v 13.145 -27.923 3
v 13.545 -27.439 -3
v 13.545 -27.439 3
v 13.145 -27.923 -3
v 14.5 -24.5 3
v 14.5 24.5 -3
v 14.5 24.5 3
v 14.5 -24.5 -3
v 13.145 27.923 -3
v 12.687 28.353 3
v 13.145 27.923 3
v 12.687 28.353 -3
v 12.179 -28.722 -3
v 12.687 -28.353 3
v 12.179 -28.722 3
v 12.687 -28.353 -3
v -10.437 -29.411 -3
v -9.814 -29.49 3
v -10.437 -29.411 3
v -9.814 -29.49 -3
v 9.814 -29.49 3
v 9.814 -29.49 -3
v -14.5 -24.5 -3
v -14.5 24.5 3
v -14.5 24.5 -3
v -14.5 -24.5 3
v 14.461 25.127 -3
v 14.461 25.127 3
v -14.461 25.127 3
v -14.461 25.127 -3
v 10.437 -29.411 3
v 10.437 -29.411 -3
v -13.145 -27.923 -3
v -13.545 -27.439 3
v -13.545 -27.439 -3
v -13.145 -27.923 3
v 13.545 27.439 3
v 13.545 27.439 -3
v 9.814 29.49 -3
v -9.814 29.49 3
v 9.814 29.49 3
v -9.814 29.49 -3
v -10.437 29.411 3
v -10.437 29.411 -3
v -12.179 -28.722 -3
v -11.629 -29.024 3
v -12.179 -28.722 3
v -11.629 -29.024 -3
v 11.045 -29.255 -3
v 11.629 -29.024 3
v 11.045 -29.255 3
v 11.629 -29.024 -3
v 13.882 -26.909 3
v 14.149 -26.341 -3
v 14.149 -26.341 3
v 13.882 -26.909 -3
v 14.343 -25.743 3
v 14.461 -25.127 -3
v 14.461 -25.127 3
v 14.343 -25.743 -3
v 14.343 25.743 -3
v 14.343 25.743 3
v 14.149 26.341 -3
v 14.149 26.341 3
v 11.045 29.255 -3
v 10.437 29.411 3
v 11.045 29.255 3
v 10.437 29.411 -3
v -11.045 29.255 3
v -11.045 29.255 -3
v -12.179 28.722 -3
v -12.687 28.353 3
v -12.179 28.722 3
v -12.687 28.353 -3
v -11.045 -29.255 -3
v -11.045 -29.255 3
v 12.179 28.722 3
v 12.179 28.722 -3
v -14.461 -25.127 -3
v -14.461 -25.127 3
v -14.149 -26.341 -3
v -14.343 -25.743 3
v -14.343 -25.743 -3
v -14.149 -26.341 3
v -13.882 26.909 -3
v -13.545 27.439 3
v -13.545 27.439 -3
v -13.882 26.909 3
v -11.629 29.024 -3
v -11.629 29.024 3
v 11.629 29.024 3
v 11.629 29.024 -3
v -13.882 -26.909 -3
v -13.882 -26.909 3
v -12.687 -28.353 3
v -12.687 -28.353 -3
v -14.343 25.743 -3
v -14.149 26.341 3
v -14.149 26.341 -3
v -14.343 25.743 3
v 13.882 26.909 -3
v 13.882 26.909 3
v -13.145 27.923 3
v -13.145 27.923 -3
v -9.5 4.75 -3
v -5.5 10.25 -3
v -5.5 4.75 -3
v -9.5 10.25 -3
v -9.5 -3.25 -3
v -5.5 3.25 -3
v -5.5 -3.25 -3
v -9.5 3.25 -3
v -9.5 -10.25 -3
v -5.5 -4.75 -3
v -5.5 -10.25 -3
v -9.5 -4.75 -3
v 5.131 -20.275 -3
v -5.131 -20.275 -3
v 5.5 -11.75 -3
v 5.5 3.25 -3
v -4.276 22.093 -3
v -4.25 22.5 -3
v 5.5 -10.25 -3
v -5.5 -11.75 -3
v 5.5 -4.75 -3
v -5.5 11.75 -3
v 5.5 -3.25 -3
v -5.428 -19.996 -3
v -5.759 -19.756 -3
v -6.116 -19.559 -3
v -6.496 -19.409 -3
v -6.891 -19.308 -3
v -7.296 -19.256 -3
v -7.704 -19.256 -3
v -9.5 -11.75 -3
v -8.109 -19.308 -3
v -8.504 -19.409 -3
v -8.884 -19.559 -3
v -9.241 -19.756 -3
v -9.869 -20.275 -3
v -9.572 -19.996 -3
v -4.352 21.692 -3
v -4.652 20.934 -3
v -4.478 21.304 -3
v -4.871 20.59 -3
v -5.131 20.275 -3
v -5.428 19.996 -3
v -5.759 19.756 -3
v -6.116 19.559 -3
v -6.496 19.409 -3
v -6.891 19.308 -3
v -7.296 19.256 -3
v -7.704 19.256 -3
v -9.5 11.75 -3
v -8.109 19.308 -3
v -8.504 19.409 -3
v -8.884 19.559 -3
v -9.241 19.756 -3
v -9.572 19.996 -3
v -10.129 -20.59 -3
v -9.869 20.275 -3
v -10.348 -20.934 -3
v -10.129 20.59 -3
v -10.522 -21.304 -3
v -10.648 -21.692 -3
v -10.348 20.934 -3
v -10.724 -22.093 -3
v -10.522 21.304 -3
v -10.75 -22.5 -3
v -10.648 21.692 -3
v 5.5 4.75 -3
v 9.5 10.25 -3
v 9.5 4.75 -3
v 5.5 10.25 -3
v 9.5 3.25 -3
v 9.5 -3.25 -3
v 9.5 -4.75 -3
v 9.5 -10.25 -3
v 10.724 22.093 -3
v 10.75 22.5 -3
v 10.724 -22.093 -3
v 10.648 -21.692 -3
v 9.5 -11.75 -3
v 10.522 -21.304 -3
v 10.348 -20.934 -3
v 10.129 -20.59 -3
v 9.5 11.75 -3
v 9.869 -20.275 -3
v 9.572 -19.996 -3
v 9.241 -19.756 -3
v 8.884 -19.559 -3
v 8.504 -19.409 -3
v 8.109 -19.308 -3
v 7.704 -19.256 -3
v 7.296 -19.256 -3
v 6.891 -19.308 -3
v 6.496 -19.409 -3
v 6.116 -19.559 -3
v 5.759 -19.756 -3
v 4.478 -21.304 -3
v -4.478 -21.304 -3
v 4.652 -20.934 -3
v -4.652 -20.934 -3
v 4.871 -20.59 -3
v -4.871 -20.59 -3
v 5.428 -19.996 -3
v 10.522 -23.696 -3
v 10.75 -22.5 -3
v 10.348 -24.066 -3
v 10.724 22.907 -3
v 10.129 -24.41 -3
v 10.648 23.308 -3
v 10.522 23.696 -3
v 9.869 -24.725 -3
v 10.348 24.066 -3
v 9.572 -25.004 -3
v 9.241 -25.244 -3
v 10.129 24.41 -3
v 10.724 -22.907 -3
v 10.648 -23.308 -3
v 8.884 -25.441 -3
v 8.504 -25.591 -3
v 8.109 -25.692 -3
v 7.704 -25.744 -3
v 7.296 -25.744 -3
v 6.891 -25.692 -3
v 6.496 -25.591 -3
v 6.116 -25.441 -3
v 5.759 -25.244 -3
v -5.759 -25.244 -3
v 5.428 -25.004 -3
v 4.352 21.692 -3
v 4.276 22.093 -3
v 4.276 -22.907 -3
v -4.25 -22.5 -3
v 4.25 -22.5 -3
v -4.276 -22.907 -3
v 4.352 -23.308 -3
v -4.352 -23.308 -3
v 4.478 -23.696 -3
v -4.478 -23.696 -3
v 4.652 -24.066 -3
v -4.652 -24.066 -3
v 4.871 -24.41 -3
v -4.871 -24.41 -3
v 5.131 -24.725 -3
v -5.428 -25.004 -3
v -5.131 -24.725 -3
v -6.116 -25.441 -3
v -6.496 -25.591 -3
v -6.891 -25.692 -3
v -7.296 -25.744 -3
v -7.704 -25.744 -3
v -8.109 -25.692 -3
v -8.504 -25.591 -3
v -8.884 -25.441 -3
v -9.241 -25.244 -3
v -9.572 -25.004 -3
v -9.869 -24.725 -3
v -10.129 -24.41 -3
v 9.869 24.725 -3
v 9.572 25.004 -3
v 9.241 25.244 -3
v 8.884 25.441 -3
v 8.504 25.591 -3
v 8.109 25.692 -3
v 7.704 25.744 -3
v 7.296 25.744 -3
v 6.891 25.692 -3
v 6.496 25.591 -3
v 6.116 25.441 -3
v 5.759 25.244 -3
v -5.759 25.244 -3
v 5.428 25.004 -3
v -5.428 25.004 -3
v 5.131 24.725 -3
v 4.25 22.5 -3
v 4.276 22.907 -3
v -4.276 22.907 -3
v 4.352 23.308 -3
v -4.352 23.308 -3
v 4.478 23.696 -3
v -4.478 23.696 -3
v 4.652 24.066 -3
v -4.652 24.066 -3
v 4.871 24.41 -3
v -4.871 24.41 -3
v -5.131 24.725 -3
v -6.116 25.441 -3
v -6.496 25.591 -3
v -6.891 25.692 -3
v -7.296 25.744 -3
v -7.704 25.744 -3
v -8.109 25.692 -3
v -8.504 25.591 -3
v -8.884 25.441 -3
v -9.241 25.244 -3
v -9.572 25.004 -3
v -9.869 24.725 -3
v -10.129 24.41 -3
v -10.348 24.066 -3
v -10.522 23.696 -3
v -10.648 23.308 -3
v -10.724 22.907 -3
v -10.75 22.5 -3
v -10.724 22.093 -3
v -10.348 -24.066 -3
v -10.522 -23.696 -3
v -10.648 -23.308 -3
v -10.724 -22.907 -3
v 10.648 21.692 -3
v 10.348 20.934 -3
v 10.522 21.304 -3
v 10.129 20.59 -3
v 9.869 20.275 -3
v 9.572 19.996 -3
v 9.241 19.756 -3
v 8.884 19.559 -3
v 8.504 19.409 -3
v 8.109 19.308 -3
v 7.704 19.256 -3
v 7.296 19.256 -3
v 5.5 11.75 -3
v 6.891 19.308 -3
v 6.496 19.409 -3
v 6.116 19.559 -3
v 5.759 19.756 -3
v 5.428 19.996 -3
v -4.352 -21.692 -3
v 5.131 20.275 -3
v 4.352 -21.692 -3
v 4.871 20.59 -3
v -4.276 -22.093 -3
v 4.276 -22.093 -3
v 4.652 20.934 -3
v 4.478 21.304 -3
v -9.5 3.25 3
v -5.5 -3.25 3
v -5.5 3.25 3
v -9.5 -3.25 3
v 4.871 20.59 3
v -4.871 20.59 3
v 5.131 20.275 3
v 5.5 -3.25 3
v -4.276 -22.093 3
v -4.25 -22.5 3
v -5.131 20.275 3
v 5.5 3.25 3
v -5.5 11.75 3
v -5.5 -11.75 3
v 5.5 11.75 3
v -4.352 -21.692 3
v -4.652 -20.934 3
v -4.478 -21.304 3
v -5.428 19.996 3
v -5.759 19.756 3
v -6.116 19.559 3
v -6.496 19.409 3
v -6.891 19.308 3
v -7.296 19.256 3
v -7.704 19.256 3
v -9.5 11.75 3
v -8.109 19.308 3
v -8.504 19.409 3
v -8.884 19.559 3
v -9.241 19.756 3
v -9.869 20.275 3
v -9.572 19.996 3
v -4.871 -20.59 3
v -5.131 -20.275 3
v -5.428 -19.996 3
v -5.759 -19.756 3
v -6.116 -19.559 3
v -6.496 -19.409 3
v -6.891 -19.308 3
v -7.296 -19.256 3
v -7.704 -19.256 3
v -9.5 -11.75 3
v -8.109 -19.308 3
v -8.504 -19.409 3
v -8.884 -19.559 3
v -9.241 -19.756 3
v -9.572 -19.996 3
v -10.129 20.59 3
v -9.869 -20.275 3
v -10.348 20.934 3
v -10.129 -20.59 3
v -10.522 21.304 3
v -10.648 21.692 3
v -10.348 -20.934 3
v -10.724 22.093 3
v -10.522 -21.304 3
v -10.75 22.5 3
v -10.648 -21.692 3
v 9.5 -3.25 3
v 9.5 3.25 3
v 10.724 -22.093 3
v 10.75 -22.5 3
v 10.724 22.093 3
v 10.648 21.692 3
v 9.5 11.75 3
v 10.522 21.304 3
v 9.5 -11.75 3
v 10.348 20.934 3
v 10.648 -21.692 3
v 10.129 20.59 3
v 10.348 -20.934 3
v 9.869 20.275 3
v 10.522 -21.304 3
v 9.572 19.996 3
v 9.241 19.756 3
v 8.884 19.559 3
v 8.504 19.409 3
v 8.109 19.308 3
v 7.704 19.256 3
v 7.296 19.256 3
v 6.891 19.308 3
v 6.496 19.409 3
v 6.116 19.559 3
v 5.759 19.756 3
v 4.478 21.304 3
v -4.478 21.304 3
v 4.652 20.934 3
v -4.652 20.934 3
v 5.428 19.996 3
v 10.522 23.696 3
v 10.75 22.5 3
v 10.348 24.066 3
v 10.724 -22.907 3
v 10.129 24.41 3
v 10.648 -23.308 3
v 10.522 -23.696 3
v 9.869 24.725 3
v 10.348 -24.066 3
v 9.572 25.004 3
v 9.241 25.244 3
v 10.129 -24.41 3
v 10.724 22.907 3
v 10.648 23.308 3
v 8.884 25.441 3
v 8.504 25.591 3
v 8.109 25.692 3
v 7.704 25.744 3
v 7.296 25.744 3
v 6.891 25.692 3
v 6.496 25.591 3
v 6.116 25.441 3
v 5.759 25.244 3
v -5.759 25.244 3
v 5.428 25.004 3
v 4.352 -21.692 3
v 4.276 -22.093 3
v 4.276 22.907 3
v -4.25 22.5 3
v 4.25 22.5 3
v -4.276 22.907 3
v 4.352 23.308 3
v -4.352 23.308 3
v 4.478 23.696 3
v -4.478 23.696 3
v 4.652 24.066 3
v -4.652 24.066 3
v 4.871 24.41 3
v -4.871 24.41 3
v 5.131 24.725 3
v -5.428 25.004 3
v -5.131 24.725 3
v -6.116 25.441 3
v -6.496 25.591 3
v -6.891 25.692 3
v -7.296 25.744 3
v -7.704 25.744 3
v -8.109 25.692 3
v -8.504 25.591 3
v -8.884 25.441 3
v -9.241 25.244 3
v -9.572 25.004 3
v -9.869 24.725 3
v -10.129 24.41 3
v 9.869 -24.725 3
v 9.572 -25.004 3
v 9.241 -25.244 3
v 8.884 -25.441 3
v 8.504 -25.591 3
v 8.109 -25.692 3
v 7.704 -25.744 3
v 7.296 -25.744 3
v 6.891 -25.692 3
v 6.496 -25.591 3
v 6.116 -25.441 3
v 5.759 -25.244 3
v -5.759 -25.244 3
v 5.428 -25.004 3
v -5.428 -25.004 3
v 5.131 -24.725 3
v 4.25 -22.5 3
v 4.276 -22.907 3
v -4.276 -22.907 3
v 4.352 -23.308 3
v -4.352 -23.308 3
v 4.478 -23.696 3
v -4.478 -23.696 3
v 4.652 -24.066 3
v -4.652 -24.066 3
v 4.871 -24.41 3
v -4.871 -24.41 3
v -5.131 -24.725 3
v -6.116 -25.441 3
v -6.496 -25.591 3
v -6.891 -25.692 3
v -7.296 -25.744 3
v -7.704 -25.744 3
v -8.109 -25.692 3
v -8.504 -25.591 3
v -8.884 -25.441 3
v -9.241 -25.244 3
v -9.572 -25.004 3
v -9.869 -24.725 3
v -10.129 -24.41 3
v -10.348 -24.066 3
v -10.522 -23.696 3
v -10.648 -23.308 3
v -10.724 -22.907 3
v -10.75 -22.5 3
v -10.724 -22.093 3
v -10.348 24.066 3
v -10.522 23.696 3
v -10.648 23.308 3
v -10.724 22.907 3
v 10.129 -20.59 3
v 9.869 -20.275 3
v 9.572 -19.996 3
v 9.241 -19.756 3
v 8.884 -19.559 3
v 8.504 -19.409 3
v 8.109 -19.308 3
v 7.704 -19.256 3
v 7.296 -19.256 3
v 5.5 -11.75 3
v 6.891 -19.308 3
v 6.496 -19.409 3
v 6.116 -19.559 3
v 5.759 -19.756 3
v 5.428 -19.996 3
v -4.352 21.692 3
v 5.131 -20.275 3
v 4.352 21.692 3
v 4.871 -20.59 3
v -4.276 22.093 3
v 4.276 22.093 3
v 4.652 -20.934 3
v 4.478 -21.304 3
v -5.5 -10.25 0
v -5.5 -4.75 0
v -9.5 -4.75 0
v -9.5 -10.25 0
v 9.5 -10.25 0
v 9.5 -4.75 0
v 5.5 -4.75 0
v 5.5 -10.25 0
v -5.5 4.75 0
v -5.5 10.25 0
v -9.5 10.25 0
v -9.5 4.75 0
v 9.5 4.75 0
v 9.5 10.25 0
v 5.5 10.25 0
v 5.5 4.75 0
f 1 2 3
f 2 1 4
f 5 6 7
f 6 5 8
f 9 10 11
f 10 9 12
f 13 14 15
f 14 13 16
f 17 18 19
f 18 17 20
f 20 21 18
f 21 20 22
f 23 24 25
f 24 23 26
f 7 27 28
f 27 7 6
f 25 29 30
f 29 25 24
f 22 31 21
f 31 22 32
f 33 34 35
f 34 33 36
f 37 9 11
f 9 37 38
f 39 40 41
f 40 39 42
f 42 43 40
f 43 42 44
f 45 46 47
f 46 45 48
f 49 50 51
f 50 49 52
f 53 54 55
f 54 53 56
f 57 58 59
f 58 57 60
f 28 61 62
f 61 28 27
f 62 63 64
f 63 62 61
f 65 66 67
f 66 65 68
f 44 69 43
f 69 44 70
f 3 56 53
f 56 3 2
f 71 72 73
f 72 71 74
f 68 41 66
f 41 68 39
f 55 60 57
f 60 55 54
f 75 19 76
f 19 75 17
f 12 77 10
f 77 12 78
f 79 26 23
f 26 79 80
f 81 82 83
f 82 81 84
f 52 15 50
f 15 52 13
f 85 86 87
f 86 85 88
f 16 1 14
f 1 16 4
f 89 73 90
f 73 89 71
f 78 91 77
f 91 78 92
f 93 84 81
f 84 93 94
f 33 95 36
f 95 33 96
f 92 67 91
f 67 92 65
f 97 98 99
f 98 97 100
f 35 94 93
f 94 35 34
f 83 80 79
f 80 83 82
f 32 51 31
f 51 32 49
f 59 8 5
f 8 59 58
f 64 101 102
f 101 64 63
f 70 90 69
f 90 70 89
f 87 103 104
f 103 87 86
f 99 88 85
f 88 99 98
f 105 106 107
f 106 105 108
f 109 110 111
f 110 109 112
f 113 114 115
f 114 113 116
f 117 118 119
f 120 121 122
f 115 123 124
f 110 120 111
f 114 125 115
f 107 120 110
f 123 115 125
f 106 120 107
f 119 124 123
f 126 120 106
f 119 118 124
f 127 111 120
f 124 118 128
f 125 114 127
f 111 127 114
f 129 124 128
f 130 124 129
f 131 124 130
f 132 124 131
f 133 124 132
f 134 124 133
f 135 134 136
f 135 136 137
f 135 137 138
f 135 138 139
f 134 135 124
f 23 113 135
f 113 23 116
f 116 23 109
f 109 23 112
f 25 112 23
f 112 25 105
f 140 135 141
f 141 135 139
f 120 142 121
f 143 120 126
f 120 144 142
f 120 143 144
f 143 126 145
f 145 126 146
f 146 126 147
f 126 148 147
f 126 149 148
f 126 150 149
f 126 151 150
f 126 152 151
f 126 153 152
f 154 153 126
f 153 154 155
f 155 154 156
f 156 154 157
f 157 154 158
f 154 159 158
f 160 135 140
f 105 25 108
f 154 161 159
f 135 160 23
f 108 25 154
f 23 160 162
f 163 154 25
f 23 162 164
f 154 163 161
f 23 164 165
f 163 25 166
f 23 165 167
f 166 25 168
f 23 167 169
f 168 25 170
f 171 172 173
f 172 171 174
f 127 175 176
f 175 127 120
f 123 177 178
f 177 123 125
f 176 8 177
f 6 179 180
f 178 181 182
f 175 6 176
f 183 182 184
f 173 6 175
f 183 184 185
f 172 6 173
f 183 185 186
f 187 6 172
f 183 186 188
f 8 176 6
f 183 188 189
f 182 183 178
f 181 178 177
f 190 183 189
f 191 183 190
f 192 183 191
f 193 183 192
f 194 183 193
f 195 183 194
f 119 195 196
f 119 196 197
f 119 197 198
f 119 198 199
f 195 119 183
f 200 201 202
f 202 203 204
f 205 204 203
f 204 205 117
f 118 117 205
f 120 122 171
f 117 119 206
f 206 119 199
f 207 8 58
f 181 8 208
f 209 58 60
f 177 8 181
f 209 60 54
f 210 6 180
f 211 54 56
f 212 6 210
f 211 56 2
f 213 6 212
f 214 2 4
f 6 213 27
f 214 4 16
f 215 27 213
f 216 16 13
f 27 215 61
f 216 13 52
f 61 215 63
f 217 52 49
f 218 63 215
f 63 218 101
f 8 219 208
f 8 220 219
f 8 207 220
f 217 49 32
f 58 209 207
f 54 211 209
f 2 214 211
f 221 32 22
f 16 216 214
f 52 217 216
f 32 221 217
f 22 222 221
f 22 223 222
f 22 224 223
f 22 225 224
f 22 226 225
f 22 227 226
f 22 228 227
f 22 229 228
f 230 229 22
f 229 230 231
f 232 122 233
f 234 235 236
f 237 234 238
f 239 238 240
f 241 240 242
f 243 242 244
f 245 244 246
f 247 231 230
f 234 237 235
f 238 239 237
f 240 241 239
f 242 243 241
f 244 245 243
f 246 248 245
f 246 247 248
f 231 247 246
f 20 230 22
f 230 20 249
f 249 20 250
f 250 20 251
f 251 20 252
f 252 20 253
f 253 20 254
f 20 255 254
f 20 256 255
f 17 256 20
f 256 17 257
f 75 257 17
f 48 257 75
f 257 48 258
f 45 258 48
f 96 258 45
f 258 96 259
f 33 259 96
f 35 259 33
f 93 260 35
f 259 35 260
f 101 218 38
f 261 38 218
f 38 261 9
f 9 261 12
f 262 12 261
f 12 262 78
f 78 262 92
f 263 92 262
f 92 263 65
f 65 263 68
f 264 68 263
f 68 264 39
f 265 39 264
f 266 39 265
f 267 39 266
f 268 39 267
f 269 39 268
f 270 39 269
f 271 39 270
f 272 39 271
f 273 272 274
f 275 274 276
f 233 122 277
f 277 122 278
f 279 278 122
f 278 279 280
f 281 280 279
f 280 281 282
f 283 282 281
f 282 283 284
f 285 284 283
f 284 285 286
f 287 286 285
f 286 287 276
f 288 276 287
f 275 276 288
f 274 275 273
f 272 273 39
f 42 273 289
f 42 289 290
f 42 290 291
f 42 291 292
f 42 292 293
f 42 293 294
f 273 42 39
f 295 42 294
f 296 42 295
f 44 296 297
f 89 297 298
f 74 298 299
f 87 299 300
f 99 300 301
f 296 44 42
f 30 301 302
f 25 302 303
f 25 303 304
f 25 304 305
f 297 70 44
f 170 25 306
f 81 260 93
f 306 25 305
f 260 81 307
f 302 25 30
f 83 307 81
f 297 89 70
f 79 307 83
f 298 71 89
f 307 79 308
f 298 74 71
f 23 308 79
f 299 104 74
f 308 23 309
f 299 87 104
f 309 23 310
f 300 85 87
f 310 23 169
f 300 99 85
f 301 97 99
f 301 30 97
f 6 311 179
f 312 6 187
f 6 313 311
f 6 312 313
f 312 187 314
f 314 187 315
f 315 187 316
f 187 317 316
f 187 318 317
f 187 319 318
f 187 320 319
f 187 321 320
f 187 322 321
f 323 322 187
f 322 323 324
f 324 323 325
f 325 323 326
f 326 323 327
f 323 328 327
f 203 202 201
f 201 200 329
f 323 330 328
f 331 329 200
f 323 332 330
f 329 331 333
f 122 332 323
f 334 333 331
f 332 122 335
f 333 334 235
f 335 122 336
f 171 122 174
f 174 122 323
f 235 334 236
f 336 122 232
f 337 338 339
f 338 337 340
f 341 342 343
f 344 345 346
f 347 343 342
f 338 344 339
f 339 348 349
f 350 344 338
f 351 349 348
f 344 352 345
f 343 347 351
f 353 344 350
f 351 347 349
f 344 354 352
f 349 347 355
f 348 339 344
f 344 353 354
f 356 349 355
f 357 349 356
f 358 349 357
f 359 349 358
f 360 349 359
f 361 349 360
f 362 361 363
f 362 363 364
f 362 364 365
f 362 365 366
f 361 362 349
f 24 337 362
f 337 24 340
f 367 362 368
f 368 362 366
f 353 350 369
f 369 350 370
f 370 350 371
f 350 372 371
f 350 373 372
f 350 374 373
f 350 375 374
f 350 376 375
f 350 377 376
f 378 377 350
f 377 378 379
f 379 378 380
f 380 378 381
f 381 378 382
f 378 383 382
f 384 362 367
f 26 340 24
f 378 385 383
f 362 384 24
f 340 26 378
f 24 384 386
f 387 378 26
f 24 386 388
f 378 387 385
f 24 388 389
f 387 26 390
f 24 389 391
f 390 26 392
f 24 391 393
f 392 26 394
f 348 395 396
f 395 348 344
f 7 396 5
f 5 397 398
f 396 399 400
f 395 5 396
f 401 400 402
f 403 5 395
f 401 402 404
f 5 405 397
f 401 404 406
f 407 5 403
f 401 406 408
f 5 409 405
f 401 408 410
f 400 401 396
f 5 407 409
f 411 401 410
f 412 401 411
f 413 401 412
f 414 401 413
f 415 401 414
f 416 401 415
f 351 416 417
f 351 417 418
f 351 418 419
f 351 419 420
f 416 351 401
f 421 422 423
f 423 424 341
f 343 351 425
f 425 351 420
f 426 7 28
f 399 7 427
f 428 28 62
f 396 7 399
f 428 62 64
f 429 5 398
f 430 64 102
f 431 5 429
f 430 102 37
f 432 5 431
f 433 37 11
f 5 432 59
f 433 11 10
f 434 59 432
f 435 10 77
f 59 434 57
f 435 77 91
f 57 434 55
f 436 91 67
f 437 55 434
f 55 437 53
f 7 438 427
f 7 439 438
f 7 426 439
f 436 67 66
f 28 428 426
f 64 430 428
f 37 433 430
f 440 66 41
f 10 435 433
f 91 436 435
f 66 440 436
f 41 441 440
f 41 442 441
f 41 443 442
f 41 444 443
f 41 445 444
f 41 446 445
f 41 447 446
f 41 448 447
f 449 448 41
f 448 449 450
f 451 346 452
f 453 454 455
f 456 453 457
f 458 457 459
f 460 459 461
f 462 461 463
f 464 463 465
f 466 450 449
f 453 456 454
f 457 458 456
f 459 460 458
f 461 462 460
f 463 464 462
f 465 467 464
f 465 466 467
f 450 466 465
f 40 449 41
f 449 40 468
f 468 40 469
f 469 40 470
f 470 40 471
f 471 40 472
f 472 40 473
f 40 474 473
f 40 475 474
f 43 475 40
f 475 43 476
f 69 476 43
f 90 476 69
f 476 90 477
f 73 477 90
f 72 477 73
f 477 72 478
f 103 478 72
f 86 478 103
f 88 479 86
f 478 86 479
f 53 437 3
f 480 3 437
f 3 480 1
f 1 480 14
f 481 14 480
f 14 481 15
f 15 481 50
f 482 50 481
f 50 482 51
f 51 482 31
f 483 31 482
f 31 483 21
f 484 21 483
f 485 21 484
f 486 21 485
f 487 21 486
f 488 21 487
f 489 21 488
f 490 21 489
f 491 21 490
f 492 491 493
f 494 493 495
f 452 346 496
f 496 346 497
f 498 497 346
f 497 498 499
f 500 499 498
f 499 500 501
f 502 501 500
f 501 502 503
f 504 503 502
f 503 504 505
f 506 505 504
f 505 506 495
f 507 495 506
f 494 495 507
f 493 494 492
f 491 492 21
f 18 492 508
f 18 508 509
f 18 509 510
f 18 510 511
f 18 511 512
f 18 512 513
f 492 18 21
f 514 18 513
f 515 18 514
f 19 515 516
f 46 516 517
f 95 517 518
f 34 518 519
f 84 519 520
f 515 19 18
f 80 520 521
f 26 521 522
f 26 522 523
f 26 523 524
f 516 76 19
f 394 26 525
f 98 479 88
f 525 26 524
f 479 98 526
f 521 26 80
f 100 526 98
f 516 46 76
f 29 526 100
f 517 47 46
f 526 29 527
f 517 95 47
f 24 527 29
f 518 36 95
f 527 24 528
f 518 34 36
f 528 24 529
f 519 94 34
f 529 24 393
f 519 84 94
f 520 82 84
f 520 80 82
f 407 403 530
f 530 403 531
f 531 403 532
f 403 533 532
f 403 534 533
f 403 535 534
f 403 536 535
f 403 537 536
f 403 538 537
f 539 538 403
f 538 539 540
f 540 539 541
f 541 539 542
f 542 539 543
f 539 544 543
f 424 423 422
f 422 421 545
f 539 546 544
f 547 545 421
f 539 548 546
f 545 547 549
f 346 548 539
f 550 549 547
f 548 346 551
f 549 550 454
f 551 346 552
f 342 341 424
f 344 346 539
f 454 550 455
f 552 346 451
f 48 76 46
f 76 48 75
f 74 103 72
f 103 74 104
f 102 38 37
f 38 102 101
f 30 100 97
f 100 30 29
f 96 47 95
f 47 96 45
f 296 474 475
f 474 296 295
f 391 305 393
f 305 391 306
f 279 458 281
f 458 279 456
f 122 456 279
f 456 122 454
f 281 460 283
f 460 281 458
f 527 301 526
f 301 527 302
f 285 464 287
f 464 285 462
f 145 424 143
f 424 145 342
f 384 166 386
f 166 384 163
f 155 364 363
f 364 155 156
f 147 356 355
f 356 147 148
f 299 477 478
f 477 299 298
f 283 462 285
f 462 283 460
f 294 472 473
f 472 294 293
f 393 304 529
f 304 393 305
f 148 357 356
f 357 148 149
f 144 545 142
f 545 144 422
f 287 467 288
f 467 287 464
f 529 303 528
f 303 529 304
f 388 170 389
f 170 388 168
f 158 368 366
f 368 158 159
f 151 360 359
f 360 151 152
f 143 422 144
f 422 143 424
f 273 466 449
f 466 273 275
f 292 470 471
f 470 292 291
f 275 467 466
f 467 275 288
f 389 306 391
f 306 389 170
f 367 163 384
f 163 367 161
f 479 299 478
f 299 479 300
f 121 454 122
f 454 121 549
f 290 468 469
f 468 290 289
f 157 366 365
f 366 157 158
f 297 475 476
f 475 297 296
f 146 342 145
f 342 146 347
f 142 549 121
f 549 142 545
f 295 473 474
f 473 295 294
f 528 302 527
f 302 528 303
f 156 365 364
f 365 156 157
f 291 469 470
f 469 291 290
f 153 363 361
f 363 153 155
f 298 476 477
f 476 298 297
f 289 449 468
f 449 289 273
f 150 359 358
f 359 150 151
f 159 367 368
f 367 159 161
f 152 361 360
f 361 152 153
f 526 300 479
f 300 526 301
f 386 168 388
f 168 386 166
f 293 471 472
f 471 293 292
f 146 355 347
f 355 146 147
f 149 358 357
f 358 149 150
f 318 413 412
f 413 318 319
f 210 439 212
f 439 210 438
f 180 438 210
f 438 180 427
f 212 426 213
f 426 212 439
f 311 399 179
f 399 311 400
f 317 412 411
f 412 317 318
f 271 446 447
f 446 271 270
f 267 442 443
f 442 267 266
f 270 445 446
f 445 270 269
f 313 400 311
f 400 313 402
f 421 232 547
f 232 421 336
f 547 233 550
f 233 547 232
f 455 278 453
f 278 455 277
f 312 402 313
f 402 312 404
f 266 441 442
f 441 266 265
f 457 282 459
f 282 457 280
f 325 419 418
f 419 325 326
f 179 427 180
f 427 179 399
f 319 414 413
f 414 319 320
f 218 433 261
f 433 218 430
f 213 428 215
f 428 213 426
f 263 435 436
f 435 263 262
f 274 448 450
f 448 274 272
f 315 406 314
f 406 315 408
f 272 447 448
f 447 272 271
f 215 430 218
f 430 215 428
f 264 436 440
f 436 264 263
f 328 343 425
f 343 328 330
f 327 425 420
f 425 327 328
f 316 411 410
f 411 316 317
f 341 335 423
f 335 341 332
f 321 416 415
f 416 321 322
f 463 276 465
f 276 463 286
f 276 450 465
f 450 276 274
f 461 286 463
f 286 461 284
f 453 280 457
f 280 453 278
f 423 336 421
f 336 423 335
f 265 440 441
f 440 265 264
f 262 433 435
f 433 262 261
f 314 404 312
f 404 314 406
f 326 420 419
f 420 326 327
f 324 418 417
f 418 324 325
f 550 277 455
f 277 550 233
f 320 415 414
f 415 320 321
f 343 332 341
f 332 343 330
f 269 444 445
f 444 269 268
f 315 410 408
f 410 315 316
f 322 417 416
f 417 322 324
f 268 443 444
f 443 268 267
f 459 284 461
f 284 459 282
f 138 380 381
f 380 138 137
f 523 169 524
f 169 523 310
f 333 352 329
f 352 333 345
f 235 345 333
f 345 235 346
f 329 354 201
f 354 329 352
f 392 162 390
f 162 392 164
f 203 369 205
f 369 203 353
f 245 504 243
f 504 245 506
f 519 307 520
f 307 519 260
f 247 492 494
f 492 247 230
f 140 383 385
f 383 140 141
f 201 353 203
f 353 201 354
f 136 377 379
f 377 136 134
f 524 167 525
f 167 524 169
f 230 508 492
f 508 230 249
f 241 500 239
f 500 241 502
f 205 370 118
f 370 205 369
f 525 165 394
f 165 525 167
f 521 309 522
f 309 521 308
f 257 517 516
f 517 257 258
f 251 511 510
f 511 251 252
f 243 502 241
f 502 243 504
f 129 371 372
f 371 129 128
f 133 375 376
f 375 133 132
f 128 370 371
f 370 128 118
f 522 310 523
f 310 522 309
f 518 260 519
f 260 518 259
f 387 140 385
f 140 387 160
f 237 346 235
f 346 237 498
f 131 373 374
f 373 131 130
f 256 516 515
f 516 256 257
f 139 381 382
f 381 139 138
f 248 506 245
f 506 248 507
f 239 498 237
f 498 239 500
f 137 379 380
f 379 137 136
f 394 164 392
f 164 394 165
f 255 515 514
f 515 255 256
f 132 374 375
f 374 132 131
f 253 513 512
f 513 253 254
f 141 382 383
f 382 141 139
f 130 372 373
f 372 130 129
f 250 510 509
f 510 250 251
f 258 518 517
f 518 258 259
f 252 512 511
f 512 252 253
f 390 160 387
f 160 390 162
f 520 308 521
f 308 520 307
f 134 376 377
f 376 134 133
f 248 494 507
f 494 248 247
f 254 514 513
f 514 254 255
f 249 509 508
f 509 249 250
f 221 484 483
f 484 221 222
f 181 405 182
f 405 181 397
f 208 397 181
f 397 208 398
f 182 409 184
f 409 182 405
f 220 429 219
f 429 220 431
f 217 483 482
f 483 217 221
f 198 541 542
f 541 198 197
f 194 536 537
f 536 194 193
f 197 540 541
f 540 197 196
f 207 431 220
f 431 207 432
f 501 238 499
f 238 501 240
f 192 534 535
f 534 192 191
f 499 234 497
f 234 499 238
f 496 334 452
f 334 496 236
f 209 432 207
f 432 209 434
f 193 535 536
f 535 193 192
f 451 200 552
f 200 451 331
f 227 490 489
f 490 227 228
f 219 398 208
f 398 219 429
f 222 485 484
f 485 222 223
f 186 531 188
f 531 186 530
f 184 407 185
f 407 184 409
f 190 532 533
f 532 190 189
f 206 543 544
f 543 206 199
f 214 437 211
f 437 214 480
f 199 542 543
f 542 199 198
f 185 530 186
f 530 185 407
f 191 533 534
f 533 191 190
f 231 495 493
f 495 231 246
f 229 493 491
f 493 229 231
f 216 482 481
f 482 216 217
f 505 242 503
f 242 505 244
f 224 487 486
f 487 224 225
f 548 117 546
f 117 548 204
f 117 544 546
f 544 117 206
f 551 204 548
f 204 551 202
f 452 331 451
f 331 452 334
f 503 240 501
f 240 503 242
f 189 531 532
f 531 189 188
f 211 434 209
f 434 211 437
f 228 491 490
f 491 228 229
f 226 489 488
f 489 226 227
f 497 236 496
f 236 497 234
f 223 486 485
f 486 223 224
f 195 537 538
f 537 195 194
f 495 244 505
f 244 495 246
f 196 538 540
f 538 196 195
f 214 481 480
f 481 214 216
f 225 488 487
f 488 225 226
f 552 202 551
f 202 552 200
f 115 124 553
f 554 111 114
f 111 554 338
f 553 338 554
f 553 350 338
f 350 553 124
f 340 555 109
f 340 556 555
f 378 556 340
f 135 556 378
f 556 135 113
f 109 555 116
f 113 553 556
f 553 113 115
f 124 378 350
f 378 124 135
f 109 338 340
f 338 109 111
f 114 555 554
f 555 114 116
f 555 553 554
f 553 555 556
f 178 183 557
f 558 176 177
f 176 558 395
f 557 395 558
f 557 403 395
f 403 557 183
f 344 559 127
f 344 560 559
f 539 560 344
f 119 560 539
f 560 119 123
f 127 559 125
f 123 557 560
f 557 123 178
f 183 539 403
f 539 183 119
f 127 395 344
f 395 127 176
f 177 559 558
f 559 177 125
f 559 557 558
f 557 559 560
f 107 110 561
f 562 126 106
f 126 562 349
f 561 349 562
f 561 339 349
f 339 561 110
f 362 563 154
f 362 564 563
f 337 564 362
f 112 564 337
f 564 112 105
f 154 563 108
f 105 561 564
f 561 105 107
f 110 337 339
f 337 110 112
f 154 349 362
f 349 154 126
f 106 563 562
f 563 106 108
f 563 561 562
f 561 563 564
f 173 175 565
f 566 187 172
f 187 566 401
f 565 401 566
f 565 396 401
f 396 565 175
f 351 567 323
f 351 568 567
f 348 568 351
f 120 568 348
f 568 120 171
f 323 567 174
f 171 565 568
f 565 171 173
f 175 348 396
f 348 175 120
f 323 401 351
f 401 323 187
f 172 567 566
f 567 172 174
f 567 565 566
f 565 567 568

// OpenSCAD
$fn = 50;


difference() {
	union() {
		translate(v = [0, 0, -3.0000000000]) {
			hull() {
				translate(v = [-9.5000000000, 24.5000000000, 0]) {
					cylinder(h = 6, r = 5);
				}
				translate(v = [9.5000000000, 24.5000000000, 0]) {
					cylinder(h = 6, r = 5);
				}
				translate(v = [-9.5000000000, -24.5000000000, 0]) {
					cylinder(h = 6, r = 5);
				}
				translate(v = [9.5000000000, -24.5000000000, 0]) {
					cylinder(h = 6, r = 5);
				}
			}
		}
		translate(v = [0, 0, -3.0000000000]) {
			hull() {
				translate(v = [-9.5000000000, 24.5000000000, 0]) {
					cylinder(h = 6, r = 5);
				}
				translate(v = [9.5000000000, 24.5000000000, 0]) {
					cylinder(h = 6, r = 5);
				}
				translate(v = [-9.5000000000, -24.5000000000, 0]) {
					cylinder(h = 6, r = 5);
				}
				translate(v = [9.5000000000, -24.5000000000, 0]) {
					cylinder(h = 6, r = 5);
				}
			}
		}
	}
	union() {
		translate(v = [-7.5000000000, 22.5000000000, -50.0000000000]) {
			cylinder(h = 100, r = 3.2500000000);
		}
		translate(v = [7.5000000000, 22.5000000000, -50.0000000000]) {
			cylinder(h = 100, r = 3.2500000000);
		}
		translate(v = [-7.5000000000, -22.5000000000, -50.0000000000]) {
			cylinder(h = 100, r = 3.2500000000);
		}
		translate(v = [7.5000000000, -22.5000000000, -50.0000000000]) {
			cylinder(h = 100, r = 3.2500000000);
		}
		translate(v = [-9.5000000000, -11.7500000000, -50]) {
			cube(size = [4, 1.5000000000, 100]);
		}
		translate(v = [-9.5000000000, -4.7500000000, -50]) {
			cube(size = [4, 1.5000000000, 100]);
		}
		translate(v = [-9.5000000000, -11.7500000000, 0]) {
			cube(size = [4, 8.5000000000, 3]);
		}
		translate(v = [5.5000000000, -11.7500000000, -50]) {
			cube(size = [4, 1.5000000000, 100]);
		}
		translate(v = [5.5000000000, -4.7500000000, -50]) {
			cube(size = [4, 1.5000000000, 100]);
		}
		translate(v = [5.5000000000, -11.7500000000, 0]) {
			cube(size = [4, 8.5000000000, 3]);
		}
		translate(v = [-9.5000000000, 3.2500000000, -50]) {
			cube(size = [4, 1.5000000000, 100]);
		}
		translate(v = [-9.5000000000, 10.2500000000, -50]) {
			cube(size = [4, 1.5000000000, 100]);
		}
		translate(v = [-9.5000000000, 3.2500000000, 0]) {
			cube(size = [4, 8.5000000000, 3]);
		}
		translate(v = [5.5000000000, 3.2500000000, -50]) {
			cube(size = [4, 1.5000000000, 100]);
		}
		translate(v = [5.5000000000, 10.2500000000, -50]) {
			cube(size = [4, 1.5000000000, 100]);
		}
		translate(v = [5.5000000000, 3.2500000000, 0]) {
			cube(size = [4, 8.5000000000, 3]);
		}
	}
}
